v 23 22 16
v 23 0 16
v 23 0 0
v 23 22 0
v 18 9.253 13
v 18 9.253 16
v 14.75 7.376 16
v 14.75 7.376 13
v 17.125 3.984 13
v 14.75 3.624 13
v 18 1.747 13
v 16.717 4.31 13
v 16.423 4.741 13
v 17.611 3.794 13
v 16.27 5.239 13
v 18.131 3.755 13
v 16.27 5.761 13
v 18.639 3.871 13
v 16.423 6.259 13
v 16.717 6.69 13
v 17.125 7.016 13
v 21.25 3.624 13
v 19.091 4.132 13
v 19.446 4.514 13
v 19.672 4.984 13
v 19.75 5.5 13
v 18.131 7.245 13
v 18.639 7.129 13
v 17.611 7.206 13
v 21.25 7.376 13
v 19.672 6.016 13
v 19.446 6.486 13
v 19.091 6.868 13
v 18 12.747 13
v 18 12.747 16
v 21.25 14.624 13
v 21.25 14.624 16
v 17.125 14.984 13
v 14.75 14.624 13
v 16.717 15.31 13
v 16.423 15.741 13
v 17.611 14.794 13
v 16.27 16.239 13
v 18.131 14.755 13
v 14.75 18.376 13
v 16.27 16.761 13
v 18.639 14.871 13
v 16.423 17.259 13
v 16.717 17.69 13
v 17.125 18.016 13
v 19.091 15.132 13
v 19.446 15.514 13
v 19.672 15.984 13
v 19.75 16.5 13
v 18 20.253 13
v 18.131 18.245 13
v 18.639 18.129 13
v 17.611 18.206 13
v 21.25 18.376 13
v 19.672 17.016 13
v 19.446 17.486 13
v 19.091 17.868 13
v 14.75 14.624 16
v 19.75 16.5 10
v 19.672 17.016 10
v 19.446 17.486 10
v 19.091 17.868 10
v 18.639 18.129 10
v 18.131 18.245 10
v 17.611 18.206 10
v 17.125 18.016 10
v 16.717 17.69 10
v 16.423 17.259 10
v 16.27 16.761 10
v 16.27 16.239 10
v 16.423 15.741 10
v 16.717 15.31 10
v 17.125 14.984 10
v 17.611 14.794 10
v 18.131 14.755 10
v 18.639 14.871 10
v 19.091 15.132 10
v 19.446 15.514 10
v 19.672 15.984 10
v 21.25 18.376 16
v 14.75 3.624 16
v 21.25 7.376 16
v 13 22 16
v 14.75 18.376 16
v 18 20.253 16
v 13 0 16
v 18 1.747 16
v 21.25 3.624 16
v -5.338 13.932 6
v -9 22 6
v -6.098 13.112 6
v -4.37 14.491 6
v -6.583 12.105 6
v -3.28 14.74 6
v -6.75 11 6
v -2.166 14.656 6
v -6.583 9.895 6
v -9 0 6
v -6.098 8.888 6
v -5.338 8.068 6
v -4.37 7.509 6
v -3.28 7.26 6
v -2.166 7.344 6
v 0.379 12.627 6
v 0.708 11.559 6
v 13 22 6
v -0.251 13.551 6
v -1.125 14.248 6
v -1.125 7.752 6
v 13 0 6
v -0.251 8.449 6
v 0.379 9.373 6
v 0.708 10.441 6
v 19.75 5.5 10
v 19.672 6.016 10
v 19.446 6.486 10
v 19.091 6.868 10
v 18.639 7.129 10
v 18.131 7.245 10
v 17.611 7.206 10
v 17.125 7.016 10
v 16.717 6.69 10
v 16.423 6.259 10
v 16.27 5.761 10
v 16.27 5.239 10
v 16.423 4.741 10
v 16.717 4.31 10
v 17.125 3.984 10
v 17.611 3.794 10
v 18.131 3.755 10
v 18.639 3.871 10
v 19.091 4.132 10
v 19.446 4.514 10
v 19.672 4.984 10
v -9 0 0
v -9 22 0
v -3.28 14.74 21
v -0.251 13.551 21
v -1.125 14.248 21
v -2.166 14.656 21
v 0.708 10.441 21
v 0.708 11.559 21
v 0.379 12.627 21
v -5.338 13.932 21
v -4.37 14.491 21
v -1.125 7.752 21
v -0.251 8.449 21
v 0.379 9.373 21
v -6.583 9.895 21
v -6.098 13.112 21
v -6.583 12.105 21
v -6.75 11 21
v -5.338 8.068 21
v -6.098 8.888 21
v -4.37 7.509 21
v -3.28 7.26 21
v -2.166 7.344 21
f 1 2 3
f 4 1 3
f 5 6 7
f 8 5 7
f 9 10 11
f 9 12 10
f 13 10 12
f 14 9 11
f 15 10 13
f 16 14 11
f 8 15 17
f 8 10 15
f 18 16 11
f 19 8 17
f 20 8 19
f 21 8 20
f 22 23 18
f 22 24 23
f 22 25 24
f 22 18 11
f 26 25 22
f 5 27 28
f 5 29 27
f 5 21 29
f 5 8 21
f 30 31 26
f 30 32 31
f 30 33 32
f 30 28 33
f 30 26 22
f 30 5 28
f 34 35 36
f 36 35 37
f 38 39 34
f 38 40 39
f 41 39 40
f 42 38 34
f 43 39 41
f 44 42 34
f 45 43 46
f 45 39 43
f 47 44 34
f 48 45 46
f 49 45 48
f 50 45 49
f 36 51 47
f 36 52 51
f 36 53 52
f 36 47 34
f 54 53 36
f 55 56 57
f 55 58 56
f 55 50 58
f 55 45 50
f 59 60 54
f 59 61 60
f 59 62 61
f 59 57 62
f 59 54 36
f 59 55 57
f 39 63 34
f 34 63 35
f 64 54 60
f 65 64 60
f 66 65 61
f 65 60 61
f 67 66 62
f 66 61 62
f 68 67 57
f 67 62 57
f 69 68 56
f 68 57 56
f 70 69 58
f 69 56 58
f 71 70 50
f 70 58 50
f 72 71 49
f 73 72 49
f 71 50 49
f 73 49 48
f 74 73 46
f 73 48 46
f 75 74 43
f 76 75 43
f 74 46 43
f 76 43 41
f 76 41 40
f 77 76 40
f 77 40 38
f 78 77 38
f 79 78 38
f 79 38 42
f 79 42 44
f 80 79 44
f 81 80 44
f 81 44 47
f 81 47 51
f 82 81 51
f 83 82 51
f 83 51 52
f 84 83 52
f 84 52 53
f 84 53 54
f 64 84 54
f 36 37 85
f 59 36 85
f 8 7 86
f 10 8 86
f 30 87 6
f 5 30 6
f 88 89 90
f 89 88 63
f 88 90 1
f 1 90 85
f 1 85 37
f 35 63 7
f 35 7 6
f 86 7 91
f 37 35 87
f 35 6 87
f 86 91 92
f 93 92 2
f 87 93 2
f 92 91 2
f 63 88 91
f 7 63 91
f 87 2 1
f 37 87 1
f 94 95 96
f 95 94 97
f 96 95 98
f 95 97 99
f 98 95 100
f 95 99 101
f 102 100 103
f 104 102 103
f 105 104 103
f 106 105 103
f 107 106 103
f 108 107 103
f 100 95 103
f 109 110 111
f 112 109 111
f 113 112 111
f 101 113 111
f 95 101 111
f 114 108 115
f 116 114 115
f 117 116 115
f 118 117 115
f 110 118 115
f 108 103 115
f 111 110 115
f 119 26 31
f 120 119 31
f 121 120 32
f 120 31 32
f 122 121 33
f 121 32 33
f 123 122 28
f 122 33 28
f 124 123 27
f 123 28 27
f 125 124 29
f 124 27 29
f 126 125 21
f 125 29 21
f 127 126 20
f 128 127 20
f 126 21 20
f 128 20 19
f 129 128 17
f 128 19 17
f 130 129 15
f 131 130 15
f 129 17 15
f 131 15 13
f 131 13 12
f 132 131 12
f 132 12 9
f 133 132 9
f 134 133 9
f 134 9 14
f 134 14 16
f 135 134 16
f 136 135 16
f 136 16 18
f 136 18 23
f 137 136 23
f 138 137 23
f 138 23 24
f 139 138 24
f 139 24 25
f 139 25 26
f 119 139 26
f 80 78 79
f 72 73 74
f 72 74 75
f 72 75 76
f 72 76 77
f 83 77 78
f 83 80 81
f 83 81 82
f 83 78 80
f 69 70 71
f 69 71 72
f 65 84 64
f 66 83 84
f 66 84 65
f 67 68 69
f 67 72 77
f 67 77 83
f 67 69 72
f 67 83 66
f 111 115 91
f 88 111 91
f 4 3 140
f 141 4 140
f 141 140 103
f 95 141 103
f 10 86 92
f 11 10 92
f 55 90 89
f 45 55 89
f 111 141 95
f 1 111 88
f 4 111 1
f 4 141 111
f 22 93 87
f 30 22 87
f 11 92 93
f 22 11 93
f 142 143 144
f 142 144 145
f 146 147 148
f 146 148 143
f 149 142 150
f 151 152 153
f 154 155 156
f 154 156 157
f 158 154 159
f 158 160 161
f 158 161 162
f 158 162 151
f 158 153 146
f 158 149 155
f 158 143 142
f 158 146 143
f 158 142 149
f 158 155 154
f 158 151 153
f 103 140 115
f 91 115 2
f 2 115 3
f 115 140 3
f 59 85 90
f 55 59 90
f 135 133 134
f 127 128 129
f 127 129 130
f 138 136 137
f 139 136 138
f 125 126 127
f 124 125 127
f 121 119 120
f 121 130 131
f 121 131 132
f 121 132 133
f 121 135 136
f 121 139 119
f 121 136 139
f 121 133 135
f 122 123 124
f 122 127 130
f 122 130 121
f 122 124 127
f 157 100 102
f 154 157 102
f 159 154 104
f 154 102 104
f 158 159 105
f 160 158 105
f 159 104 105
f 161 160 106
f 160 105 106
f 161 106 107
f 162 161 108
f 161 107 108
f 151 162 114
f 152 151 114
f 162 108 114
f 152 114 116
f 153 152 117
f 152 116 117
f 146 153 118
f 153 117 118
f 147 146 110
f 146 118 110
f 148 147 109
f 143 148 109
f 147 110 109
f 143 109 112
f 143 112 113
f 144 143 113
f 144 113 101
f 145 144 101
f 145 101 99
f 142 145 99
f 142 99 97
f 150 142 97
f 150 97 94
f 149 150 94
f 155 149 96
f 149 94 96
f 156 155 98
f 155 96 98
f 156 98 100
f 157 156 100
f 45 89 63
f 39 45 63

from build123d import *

# Parameters (mm, degrees)
BOSS_EXTRUDE1_DEPTH = 22
SKETCH3_R           = 3.75
BOSS_EXTRUDE2_DEPTH = 15
SKETCH7_R           = 1.75
CUT_EXTRUDE3_DEPTH  = 6
CUT_EXTRUDE4_DEPTH  = 3


with BuildPart() as part:
    # Sketch2 → Boss-Extrude1 (new body)
    with BuildSketch(Plane(origin=(0, 0, 0), x_dir=(1, 0, 0), z_dir=(0, 1, 0))):
        Polygon((23, 0), (-9, 0), (-9, -6), (13, -6), (13, -16), (23, -16), align=None)
    extrude(amount=BOSS_EXTRUDE1_DEPTH)

    # Sketch3 → Boss-Extrude2 (add)
    with BuildSketch(Plane.XY.offset(6)):
        with Locations(Location((-3, 11, 0), (0, 0, 180))):
            Circle(SKETCH3_R)
    extrude(amount=BOSS_EXTRUDE2_DEPTH)

    # Sketch7 → Cut-Extrude3 (cut)
    with BuildSketch(Plane.XY.offset(16)):
        with Locations((18, 16.5)):
            Circle(SKETCH7_R)
        with Locations((18, 5.5)):
            Circle(SKETCH7_R)
    extrude(amount=-CUT_EXTRUDE3_DEPTH, mode=Mode.SUBTRACT)

    # Sketch8 → Cut-Extrude4 (cut)
    with BuildSketch(Plane.XY.offset(16)):
        Polygon((21.25, 14.623611625), (21.25, 18.376388375), (18, 20.25277675), (14.75, 18.376388375), (14.75, 14.623611625), (18, 12.74722325), align=None)
        Polygon((21.25, 3.623611625), (21.25, 7.376388375), (18, 9.25277675), (14.75, 7.376388375), (14.75, 3.623611625), (18, 1.74722325), align=None)
    extrude(amount=-CUT_EXTRUDE4_DEPTH, mode=Mode.SUBTRACT)


solid = part.part
